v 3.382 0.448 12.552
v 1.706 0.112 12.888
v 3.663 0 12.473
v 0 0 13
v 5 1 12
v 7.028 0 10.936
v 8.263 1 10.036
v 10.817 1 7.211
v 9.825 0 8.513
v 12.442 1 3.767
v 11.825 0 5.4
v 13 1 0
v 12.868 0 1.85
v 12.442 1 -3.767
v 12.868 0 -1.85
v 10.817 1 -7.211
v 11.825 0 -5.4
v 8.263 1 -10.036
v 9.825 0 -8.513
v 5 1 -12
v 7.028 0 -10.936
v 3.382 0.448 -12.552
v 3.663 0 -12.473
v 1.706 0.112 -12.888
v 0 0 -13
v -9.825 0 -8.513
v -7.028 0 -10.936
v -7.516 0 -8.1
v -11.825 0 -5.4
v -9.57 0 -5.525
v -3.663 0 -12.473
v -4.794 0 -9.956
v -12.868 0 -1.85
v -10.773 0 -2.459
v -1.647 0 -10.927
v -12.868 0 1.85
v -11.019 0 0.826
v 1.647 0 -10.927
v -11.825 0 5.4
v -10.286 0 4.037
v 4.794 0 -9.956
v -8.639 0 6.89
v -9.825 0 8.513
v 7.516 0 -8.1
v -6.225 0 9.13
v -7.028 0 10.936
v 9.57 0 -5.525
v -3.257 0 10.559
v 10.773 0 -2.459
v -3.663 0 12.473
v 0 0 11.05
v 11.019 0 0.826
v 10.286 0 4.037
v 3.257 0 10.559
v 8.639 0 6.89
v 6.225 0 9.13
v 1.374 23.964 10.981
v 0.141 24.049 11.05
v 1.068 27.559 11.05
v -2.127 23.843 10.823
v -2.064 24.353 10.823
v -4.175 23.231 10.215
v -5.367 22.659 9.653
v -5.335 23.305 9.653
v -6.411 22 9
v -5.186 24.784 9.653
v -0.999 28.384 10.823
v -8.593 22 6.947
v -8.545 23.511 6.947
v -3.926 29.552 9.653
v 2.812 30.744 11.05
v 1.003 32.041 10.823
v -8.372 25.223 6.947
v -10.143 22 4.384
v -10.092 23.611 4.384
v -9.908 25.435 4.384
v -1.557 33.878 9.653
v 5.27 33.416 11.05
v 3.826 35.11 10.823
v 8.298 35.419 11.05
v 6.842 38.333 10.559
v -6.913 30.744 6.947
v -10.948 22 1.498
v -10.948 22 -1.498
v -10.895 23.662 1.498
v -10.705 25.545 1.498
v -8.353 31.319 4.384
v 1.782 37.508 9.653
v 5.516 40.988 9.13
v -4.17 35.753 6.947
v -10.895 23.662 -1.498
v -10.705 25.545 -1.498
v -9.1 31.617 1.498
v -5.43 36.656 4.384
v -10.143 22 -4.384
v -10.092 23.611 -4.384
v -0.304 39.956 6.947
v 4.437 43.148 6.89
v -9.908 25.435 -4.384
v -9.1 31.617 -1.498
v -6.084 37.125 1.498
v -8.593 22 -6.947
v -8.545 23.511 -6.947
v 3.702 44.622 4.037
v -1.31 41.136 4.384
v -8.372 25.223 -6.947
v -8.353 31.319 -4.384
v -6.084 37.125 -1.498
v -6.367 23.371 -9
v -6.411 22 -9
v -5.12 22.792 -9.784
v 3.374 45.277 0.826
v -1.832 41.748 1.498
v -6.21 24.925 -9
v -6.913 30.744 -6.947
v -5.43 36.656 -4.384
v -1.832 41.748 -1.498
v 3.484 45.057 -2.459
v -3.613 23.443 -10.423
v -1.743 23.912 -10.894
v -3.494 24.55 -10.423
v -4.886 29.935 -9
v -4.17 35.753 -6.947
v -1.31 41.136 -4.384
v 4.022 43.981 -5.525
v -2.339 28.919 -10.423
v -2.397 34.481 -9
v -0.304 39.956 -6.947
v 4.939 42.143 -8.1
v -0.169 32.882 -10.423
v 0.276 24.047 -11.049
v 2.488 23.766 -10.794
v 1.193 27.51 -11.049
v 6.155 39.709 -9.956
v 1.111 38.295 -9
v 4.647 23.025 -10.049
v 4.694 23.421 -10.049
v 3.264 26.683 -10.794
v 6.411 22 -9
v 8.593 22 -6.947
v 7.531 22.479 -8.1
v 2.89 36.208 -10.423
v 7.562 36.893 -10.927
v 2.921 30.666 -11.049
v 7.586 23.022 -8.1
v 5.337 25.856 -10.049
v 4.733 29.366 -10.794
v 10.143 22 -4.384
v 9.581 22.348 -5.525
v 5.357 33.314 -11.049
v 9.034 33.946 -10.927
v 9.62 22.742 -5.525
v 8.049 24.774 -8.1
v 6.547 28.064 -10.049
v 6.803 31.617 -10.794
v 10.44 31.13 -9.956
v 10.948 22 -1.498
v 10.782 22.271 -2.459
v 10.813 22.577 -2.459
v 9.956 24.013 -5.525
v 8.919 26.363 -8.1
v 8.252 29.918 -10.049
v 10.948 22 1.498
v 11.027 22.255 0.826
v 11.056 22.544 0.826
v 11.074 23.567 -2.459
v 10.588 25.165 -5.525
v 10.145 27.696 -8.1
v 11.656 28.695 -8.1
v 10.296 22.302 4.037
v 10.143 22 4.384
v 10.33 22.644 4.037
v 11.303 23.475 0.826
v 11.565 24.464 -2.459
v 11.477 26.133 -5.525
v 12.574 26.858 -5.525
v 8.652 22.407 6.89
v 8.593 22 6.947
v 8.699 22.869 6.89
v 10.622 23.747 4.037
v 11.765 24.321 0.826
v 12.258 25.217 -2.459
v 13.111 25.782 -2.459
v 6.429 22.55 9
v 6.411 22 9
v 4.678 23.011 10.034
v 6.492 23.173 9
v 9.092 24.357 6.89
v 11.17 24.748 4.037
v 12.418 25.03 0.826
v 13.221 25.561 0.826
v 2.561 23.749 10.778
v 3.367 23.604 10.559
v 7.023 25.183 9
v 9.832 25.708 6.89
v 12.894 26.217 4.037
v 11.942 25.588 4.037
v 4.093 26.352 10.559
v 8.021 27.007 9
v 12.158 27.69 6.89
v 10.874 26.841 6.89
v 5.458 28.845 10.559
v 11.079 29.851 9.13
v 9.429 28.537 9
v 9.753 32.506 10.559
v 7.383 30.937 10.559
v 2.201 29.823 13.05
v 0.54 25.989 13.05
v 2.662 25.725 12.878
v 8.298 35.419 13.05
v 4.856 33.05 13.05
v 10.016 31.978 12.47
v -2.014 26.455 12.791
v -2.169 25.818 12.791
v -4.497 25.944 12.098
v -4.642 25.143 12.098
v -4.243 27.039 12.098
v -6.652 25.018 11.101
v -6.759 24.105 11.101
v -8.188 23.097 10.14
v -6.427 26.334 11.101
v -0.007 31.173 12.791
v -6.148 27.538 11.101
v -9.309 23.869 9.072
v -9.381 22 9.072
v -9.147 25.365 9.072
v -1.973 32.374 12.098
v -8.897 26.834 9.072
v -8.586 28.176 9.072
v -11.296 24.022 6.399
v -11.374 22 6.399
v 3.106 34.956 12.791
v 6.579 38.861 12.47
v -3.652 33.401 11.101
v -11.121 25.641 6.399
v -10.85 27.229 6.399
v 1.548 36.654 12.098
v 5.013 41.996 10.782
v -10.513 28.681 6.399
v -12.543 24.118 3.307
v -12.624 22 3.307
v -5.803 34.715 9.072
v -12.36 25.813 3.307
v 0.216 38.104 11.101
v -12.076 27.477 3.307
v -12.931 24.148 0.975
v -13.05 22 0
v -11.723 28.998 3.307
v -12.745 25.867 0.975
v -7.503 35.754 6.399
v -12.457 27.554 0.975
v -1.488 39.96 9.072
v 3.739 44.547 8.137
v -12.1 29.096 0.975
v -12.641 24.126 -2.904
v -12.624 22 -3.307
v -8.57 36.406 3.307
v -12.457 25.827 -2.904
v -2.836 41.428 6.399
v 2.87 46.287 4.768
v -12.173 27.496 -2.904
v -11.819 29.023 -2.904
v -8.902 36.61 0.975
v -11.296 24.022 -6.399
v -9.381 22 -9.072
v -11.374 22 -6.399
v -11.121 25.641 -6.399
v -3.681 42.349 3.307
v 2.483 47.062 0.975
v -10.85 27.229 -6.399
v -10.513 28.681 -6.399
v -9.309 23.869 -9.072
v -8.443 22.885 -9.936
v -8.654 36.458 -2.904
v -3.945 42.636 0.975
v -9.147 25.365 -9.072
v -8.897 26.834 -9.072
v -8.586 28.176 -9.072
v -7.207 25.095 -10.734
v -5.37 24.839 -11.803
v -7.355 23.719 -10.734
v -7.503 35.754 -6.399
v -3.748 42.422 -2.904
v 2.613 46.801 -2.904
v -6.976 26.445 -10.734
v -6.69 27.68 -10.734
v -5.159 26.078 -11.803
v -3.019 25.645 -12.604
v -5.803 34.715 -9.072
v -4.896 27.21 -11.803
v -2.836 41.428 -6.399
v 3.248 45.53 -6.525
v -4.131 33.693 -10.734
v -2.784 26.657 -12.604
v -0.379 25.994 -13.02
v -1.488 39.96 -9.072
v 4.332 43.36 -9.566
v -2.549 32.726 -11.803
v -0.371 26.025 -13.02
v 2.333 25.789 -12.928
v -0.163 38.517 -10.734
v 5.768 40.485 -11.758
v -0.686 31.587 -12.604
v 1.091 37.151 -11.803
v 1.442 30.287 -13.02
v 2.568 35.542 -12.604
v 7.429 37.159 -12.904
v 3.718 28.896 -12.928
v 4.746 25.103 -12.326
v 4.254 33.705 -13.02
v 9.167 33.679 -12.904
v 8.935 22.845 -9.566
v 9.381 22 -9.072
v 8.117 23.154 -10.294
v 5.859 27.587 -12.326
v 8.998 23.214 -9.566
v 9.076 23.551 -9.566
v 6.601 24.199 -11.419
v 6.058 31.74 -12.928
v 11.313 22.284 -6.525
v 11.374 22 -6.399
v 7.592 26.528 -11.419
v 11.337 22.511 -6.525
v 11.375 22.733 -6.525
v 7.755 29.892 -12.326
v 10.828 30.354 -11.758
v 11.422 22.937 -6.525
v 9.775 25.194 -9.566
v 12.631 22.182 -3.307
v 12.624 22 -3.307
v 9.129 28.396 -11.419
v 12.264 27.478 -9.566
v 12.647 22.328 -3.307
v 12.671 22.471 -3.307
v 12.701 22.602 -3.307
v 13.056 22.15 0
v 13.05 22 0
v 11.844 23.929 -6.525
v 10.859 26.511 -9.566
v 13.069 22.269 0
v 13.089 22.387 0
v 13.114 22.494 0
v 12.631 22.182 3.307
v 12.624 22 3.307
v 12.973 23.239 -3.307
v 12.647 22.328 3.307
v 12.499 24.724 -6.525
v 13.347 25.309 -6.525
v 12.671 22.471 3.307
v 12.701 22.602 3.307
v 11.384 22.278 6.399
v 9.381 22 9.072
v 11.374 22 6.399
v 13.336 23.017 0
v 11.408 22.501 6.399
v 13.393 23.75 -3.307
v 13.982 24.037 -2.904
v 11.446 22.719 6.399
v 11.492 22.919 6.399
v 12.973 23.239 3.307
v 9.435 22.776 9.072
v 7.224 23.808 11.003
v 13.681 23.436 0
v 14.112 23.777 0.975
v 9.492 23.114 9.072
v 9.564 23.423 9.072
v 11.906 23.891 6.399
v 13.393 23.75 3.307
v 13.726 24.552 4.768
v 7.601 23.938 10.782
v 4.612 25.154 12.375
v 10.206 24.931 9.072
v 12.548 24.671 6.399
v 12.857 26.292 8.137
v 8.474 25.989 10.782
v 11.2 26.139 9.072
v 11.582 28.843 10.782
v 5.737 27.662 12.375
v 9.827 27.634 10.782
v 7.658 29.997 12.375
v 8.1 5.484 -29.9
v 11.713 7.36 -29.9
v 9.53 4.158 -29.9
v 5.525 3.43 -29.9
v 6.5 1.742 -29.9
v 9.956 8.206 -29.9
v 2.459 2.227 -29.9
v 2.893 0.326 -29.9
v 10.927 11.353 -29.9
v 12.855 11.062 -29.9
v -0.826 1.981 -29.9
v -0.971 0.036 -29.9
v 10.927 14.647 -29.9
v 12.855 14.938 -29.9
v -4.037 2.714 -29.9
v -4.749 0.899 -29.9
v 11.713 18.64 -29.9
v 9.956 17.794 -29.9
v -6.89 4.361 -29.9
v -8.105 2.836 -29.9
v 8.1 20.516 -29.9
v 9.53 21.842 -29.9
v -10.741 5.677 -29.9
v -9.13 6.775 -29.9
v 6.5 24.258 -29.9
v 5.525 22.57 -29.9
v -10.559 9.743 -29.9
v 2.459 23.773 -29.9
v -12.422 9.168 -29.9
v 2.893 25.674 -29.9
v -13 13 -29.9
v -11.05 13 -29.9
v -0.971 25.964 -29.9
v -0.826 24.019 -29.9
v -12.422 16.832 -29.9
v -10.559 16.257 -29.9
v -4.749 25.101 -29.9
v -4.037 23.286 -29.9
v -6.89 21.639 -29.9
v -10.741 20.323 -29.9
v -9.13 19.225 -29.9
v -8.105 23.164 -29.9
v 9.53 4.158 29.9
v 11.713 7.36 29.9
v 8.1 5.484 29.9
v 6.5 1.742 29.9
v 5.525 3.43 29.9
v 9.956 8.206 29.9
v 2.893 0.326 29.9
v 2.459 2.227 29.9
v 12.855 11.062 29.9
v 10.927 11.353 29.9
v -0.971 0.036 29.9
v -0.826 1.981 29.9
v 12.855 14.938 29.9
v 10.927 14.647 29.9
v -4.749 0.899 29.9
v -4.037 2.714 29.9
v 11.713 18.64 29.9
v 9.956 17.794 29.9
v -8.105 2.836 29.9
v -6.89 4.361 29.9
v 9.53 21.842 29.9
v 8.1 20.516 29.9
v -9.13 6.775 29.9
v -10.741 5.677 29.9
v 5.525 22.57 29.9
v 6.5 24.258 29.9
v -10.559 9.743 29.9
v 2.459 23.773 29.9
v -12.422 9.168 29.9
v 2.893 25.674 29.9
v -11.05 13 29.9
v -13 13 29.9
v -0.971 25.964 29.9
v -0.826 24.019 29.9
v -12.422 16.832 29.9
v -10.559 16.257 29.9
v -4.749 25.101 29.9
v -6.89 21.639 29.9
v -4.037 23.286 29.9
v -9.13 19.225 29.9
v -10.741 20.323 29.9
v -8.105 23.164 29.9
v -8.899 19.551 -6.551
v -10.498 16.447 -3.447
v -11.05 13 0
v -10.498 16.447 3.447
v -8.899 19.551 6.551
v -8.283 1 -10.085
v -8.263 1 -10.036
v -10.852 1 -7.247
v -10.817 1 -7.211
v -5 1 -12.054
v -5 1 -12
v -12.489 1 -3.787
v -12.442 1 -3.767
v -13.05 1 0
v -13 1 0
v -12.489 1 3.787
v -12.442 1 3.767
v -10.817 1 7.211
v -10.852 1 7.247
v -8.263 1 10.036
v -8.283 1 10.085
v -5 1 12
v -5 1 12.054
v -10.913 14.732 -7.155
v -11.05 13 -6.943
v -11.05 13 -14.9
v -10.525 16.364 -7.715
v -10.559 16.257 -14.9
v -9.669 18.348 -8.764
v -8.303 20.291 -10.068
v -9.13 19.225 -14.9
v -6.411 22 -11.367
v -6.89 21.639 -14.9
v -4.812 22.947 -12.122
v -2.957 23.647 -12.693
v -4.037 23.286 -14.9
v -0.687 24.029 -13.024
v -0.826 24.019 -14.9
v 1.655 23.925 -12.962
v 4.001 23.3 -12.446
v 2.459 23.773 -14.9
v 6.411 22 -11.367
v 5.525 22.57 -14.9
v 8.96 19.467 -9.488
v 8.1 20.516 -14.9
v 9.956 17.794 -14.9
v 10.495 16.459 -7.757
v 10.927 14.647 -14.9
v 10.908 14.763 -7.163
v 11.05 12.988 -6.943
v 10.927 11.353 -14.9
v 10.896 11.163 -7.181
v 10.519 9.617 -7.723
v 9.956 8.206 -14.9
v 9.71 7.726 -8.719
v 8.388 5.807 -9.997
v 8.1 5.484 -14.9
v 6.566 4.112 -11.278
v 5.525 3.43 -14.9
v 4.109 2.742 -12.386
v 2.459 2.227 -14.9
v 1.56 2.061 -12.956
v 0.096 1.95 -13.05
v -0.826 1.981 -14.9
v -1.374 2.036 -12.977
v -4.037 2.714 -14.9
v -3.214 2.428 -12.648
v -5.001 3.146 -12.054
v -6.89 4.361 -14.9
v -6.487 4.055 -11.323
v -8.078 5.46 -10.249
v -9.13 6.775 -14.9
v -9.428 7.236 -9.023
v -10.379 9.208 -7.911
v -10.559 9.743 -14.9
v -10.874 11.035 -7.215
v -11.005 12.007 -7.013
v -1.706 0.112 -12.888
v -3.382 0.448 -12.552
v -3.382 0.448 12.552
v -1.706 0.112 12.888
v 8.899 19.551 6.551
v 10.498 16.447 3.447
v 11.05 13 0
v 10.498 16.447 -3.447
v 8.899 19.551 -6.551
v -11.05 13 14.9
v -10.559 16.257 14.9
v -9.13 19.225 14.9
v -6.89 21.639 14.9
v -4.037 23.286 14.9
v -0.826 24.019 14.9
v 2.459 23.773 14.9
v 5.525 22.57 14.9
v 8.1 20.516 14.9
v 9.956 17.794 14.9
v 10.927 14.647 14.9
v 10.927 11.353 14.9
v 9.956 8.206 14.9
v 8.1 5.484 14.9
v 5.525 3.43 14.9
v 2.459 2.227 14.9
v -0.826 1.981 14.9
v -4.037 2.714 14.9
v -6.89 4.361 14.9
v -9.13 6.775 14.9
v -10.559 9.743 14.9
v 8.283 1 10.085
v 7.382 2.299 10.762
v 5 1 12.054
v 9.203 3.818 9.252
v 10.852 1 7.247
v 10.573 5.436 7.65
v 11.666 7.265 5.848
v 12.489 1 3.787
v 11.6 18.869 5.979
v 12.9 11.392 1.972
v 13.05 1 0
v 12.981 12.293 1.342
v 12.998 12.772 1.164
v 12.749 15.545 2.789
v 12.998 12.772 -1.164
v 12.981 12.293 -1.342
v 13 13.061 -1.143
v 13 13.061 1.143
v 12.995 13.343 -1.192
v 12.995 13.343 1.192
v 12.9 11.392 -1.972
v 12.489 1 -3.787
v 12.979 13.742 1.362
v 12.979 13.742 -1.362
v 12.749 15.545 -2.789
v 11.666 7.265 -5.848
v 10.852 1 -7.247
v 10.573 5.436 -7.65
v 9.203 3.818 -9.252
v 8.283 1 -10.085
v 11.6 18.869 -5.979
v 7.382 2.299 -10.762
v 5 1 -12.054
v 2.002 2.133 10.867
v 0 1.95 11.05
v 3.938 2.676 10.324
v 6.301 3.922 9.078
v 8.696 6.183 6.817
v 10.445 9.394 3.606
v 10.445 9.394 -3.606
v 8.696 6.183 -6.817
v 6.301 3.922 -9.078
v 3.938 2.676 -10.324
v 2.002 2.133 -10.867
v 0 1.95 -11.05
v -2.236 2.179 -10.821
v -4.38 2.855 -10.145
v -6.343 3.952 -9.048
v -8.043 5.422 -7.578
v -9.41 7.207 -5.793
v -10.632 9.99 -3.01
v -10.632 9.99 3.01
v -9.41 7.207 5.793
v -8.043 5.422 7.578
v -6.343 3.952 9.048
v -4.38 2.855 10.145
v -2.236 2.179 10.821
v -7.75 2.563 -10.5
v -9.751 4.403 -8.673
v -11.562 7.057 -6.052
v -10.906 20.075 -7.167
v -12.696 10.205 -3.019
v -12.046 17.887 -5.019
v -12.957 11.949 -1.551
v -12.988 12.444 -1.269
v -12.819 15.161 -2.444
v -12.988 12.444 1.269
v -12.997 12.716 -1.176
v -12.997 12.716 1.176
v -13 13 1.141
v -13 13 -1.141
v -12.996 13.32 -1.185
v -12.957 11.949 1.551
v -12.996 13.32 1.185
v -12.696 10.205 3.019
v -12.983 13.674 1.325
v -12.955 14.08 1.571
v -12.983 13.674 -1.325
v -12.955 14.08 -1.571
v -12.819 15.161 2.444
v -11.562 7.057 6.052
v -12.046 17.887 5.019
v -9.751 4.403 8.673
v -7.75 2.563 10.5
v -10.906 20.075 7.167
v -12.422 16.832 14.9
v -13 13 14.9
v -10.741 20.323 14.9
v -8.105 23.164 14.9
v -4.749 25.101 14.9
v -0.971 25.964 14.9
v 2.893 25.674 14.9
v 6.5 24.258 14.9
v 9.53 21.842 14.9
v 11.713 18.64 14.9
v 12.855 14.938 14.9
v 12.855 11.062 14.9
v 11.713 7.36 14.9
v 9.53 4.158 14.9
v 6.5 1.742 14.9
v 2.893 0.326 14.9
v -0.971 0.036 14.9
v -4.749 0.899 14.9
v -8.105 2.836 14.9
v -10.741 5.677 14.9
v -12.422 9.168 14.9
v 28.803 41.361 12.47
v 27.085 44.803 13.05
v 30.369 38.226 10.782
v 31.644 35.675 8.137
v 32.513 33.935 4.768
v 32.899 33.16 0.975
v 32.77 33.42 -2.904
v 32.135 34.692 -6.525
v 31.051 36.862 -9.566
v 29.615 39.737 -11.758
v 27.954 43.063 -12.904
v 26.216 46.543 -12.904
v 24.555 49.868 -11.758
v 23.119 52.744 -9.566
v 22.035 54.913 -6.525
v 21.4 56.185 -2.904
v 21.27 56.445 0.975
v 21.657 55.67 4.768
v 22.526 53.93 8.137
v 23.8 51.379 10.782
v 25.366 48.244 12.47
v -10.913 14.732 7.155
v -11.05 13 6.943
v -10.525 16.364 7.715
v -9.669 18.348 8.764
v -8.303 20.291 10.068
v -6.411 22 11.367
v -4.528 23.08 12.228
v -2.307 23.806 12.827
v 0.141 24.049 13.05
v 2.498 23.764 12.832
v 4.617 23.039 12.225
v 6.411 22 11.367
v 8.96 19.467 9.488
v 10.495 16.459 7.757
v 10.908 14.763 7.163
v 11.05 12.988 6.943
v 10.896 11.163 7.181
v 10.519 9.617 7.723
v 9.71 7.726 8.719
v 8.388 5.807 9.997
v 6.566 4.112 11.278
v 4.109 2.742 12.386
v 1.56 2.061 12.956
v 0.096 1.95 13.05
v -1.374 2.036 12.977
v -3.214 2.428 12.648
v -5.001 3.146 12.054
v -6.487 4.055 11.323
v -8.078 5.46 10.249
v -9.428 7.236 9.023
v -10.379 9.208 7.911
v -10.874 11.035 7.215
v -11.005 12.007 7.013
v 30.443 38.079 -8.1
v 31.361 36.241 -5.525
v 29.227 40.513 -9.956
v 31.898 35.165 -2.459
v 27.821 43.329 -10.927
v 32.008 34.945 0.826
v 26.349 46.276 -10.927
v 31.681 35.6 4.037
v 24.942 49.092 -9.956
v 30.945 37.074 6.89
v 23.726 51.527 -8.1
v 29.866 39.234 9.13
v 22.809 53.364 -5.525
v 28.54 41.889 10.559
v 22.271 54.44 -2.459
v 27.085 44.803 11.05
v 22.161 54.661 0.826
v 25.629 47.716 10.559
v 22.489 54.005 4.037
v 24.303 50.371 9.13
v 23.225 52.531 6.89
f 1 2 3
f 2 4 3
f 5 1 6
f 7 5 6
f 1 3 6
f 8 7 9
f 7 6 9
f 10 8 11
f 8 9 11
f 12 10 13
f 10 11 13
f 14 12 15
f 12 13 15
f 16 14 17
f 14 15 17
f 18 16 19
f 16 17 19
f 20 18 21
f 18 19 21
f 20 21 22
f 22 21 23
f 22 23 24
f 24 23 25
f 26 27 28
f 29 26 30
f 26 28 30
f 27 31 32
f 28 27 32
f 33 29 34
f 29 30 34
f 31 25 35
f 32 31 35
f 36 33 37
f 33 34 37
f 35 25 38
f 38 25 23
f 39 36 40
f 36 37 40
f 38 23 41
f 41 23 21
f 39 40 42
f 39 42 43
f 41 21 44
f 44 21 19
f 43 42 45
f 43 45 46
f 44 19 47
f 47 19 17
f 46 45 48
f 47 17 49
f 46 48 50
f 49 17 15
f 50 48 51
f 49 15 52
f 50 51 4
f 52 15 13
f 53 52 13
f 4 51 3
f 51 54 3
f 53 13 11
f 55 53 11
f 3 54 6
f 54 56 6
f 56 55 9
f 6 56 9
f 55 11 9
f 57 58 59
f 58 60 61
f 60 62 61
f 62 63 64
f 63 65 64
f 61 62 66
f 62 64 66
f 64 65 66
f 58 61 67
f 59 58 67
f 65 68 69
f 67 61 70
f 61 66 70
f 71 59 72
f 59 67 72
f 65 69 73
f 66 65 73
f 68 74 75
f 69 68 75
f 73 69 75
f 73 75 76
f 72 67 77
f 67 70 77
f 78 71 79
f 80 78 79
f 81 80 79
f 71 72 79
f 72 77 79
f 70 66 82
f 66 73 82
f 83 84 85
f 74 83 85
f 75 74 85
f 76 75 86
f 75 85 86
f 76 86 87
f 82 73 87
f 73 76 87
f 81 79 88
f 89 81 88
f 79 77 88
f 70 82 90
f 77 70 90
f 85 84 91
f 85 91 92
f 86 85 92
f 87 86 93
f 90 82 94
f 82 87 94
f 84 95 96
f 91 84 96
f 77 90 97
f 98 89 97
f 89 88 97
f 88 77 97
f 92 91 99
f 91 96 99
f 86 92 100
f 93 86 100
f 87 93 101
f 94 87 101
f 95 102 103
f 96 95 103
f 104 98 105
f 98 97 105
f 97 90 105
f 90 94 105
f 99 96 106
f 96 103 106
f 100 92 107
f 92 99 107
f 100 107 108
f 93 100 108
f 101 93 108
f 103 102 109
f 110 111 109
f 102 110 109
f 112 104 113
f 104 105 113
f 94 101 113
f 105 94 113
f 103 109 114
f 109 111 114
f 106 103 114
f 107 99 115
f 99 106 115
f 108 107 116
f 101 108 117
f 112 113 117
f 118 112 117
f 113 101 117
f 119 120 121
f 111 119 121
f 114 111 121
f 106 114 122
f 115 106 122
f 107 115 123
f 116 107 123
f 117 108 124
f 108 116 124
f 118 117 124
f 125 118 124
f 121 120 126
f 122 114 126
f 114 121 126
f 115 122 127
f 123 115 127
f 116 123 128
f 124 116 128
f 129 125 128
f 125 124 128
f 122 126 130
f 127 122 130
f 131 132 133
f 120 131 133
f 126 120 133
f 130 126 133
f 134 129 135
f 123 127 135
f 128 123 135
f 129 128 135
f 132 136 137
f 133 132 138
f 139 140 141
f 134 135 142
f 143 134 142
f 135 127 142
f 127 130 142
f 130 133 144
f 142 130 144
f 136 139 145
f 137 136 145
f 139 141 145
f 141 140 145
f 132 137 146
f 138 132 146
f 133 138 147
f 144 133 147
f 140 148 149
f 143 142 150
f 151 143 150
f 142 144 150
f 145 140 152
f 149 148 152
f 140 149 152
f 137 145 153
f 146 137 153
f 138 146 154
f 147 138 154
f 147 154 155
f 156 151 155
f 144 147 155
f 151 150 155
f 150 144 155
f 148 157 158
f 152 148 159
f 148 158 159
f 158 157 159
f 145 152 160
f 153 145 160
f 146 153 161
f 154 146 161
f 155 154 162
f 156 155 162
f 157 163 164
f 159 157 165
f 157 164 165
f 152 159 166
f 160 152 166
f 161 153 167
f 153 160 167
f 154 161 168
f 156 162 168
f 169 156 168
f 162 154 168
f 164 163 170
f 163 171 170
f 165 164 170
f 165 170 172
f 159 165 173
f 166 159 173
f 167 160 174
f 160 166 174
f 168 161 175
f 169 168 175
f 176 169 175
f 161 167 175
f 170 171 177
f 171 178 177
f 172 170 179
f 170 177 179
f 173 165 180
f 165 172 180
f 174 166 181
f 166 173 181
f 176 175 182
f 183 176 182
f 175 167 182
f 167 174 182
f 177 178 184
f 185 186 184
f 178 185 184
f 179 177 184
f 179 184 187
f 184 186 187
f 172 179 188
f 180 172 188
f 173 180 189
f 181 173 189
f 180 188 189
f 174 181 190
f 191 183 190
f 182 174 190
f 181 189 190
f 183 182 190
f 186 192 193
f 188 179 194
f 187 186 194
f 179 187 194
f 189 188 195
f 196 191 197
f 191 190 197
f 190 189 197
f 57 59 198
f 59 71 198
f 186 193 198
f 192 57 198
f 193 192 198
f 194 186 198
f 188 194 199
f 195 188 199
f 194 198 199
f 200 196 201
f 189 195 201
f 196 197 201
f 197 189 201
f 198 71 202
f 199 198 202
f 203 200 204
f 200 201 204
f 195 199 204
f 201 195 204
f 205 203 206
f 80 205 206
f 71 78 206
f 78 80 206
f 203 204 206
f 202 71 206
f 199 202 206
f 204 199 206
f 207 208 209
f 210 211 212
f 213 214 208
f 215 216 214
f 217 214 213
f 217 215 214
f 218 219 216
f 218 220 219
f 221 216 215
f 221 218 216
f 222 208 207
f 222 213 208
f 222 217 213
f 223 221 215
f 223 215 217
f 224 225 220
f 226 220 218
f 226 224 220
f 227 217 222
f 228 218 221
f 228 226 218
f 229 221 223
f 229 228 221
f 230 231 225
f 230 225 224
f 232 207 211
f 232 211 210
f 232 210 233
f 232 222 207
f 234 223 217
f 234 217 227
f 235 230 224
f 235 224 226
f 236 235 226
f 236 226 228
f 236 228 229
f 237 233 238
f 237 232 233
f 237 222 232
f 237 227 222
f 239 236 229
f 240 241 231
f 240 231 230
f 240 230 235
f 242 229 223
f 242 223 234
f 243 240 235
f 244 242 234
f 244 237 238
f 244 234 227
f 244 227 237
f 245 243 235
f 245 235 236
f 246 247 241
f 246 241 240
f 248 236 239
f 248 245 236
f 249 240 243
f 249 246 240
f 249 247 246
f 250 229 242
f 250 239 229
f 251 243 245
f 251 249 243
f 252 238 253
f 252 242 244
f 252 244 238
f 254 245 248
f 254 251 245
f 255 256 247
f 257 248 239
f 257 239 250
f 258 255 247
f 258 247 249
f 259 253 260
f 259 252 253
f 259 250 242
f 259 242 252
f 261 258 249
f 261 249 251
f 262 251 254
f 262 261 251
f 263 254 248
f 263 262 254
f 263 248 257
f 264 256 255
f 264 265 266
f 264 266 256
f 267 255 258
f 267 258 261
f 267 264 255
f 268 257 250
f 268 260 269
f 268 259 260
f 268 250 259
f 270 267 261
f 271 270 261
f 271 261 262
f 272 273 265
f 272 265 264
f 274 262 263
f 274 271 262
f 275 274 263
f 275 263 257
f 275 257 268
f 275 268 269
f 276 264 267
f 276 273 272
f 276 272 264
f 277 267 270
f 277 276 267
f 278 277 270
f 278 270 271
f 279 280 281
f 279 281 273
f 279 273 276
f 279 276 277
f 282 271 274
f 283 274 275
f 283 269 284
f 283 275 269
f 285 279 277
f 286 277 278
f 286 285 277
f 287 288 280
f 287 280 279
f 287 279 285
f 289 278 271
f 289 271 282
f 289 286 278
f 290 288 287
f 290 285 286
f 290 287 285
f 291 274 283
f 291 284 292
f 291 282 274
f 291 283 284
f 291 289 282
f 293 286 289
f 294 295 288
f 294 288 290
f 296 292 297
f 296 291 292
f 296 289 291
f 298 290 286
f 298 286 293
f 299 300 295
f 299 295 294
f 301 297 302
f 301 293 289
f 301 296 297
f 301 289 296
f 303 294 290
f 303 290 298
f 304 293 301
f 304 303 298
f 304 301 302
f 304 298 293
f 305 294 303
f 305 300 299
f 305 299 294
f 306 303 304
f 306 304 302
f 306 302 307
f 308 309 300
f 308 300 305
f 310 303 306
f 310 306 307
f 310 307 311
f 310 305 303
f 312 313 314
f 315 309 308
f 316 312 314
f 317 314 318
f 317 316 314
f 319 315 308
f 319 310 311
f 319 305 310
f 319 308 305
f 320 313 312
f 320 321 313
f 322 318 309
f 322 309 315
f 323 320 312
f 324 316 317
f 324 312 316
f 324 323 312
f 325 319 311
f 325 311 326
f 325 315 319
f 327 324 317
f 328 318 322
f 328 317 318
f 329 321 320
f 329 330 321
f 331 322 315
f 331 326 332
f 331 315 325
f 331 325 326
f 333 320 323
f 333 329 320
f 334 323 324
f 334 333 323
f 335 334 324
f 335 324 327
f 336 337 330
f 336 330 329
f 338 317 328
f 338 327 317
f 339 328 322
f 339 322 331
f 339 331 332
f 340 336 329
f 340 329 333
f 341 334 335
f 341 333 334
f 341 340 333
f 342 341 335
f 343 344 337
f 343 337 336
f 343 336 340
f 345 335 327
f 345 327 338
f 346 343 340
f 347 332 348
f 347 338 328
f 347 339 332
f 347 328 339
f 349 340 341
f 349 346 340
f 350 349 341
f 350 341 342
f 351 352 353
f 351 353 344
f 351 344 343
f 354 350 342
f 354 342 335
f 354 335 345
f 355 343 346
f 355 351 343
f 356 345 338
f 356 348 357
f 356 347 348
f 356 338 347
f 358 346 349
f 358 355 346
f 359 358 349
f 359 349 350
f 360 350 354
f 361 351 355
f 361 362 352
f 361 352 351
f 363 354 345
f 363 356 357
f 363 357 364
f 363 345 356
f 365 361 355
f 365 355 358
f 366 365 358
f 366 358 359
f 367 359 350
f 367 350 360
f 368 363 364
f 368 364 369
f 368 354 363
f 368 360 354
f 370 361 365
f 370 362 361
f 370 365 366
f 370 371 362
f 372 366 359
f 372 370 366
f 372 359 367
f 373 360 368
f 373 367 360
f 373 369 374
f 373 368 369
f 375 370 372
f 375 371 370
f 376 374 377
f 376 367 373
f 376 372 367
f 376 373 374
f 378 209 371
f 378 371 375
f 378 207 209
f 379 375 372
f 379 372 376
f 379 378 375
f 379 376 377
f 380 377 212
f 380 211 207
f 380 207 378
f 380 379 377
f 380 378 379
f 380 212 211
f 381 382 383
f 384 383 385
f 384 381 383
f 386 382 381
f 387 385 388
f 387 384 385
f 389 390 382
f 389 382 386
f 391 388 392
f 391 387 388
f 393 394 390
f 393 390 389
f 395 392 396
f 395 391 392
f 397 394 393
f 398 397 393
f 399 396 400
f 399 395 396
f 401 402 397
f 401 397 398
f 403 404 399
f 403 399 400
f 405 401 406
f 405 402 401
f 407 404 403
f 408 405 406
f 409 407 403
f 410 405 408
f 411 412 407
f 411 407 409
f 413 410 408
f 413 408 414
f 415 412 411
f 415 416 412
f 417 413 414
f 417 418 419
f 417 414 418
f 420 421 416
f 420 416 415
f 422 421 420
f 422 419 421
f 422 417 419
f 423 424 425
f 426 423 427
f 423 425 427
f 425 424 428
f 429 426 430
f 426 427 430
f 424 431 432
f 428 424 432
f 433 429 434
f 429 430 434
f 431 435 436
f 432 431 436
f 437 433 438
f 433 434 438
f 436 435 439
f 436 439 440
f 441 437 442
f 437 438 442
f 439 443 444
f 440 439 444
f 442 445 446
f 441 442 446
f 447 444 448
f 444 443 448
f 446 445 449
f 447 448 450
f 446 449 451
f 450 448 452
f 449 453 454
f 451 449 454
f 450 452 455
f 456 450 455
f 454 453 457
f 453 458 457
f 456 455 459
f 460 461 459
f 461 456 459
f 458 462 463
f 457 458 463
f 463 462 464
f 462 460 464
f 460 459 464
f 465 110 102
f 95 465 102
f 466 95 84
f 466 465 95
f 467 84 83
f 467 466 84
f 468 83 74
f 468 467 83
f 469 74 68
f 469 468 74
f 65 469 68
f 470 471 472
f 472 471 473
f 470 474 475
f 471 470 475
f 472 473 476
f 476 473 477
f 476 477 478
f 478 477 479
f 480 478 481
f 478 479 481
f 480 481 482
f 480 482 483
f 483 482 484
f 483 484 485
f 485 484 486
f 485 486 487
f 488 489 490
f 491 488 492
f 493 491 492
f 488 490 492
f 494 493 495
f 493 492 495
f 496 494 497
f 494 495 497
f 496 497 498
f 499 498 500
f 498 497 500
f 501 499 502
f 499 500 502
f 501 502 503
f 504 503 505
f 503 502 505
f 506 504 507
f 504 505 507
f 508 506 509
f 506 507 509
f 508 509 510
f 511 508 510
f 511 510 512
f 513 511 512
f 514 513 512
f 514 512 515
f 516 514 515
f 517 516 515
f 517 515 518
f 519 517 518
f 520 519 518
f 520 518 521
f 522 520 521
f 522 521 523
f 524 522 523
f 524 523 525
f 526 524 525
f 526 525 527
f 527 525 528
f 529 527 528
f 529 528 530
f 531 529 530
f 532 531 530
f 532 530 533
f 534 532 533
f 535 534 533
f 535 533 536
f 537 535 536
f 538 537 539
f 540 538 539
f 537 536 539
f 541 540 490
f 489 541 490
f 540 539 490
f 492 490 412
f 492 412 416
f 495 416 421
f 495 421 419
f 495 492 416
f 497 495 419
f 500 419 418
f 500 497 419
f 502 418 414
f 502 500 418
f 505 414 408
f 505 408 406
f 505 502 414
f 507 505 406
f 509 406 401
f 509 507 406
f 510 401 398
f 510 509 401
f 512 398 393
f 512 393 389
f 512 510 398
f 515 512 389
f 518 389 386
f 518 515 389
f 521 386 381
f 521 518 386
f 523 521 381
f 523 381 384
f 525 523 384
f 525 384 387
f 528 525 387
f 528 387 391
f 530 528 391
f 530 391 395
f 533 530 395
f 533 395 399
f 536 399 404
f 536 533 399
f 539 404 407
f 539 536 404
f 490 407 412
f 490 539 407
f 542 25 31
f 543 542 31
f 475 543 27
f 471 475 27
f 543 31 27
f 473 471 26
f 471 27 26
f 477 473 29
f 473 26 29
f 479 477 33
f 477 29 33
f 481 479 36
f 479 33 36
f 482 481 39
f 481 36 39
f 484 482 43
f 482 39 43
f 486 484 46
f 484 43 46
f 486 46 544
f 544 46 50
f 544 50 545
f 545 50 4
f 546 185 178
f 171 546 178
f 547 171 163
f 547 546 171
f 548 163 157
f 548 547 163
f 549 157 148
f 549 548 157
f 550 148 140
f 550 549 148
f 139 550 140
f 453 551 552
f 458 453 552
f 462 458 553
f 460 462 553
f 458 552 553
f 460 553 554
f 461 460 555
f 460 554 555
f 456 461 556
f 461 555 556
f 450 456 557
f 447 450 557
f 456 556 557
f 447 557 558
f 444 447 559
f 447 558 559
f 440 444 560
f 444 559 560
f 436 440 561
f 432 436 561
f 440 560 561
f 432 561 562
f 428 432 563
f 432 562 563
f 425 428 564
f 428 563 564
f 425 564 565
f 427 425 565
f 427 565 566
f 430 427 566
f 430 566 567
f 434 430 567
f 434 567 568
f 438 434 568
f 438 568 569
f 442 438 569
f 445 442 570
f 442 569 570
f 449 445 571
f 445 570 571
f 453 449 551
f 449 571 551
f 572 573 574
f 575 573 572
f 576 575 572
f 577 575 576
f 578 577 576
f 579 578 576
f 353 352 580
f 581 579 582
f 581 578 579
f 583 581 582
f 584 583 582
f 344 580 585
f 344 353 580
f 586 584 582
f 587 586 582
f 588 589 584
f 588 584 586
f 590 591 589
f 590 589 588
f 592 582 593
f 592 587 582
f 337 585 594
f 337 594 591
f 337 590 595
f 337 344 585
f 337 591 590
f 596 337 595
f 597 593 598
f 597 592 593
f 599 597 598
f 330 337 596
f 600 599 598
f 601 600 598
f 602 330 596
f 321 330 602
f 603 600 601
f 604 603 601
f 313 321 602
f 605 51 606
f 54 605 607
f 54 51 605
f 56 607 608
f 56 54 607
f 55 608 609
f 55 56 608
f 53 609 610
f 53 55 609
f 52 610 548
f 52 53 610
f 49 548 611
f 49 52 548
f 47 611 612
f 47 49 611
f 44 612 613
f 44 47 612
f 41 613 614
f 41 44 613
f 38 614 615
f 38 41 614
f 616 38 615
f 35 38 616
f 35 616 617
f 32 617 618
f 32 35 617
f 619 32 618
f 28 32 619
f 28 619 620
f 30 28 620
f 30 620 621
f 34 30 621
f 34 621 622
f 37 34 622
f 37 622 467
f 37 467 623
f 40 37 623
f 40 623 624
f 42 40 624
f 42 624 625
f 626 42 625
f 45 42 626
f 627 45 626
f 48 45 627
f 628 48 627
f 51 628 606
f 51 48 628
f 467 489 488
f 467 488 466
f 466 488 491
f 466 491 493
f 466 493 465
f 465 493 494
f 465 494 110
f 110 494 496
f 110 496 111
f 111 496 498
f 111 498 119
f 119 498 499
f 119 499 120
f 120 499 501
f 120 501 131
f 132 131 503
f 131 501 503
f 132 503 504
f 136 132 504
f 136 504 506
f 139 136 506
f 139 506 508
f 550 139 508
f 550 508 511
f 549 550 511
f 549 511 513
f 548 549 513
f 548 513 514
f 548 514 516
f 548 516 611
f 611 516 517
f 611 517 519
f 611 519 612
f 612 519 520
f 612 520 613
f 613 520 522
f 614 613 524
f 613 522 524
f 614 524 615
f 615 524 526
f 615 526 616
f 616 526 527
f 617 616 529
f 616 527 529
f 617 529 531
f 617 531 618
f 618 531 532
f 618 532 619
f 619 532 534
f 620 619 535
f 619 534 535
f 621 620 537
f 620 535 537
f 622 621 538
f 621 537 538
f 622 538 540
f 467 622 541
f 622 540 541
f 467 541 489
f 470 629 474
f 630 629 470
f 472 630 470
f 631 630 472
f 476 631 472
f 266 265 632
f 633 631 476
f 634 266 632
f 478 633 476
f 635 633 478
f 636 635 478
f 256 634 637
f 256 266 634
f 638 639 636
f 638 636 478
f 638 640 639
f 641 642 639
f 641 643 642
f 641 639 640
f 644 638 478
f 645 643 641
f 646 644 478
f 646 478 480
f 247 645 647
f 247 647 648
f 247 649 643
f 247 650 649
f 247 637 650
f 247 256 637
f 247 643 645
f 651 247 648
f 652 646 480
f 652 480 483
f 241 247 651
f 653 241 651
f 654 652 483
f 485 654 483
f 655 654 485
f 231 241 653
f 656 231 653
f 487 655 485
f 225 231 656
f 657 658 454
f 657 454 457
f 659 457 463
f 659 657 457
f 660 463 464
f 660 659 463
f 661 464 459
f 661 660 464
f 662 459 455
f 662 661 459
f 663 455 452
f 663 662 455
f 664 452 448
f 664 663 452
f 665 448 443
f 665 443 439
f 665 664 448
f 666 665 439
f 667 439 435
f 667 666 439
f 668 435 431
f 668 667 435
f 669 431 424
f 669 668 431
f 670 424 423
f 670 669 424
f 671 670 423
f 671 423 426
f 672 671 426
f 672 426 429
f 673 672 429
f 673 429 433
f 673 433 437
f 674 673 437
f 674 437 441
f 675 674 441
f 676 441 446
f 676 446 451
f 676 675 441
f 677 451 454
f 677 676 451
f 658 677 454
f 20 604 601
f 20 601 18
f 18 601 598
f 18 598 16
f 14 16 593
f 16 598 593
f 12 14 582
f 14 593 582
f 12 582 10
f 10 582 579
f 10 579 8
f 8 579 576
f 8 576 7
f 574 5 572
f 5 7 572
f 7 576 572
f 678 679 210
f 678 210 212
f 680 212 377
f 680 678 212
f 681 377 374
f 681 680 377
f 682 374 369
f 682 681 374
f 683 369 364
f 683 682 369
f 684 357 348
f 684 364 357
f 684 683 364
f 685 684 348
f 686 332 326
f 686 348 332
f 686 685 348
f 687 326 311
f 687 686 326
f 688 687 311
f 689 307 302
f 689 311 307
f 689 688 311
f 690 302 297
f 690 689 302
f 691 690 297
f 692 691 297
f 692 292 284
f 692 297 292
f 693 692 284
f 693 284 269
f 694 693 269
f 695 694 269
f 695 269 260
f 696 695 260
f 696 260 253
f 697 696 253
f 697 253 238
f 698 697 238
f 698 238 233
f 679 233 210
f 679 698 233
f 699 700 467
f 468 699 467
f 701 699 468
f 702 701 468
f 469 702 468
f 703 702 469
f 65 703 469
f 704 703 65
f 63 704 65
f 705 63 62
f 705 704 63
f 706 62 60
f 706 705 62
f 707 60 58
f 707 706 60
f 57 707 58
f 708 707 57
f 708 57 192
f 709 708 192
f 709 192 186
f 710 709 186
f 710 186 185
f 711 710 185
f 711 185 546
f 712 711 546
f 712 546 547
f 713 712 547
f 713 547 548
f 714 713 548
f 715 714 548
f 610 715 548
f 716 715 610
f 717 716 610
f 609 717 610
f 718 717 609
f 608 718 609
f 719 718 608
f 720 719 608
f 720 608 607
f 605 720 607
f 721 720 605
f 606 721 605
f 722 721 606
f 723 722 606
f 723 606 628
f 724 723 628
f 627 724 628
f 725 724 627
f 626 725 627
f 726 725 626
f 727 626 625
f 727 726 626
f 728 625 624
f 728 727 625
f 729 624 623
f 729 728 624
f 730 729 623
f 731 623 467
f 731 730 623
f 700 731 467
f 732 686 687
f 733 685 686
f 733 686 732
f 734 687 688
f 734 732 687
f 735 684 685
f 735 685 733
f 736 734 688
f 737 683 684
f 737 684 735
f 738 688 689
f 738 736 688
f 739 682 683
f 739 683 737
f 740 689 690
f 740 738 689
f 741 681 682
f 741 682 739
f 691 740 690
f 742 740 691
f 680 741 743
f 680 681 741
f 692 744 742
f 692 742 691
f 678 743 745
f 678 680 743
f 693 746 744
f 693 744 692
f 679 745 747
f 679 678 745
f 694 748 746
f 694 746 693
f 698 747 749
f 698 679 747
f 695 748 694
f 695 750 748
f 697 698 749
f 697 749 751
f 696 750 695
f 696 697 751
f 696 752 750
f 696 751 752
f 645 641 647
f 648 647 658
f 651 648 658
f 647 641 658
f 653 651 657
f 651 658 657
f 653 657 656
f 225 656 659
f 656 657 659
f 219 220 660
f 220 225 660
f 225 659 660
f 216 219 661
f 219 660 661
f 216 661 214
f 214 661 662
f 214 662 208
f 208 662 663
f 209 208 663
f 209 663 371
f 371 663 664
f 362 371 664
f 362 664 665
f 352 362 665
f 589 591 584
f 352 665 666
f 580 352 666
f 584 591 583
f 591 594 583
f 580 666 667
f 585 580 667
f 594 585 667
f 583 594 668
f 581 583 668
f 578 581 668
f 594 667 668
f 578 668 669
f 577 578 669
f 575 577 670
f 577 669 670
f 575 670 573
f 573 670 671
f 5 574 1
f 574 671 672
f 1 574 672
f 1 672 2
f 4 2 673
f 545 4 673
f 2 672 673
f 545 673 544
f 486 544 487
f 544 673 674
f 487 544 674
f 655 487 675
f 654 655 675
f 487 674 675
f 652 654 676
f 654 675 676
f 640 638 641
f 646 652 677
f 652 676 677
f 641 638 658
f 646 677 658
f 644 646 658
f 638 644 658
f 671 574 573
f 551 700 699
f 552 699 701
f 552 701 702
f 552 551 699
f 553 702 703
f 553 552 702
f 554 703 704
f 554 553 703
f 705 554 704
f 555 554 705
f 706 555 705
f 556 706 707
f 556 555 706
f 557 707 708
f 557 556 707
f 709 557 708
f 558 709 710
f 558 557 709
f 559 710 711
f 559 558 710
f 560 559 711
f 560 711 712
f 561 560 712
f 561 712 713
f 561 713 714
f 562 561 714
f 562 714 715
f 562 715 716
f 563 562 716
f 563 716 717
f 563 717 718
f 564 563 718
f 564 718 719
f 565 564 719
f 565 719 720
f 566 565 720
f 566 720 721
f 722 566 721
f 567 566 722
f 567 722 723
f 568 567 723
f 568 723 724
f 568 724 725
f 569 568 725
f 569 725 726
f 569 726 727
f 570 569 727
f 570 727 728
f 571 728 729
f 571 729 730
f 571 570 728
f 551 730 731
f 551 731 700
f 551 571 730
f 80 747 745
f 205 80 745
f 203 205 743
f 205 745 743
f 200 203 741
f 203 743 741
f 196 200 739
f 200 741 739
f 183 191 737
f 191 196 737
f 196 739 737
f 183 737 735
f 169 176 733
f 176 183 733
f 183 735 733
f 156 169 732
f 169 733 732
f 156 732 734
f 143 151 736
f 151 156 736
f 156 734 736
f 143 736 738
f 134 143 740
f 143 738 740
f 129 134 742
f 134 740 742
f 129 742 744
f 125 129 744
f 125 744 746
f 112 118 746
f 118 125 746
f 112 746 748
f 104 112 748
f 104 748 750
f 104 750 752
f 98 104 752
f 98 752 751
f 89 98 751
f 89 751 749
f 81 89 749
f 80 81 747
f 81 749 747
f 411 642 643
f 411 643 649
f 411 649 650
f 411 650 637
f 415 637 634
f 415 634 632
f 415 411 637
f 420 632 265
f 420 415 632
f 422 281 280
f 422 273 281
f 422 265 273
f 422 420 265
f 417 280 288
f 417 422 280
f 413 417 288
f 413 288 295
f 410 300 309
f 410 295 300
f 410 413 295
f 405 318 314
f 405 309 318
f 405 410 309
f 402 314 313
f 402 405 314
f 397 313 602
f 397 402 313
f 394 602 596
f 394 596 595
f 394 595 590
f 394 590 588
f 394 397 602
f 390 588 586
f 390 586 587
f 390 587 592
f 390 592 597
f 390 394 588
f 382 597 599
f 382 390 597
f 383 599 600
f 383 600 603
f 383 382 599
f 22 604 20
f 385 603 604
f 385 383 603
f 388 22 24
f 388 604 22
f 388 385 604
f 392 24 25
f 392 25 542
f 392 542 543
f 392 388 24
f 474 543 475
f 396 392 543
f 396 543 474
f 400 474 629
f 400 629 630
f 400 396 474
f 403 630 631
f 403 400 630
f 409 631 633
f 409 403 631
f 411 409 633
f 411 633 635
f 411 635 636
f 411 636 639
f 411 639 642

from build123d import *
from build123d.topology import SkipClean

# Parameters (mm, degrees)
CROQUIS1_R                          = 13
CROQUIS1_R_2                        = 11.05
SALIENTE_EXTRUIR1_DEPTH             = 1
BARRER_L_MINA1_PROFILE_R            = 13.05
BARRER_L_MINA1_PROFILE_R_2          = 11.05
CROQUIS35_R                         = 13
CROQUIS35_R_2                       = 11.05
SALIENTE_EXTRUIR3_DEPTH             = 15
SALIENTE_EXTRUIR3_DIRECTION_2_REACH = 73.094
CORTAR_EXTRUIR1_REACH               = 80.217
CROQUIS37_R                         = 11.05


with BuildPart() as part:
    # Croquis1 → Saliente-Extruir1 (new body)
    with BuildSketch(Plane(origin=(0, 0, 0), x_dir=(1, 0, 0), z_dir=(0, 1, 0))):
        with Locations(Location((0, 0, 0), (0, 0, 270))):
            Circle(CROQUIS1_R)
        with Locations(Location((0, 0, 0), (0, 0, 270))):
            Circle(CROQUIS1_R_2, mode=Mode.SUBTRACT)
    extrude(amount=SALIENTE_EXTRUIR1_DEPTH)

    # Barrer-L_mina1: sweep along a path in Croquis2
    with BuildLine(Plane.XY) as barrer_l_mina1_path:
        Line((0, 1), (0, 22))
        ThreePointArc((0, 22), (2.241962153, 29.88875594), (8.297662704, 35.41933958))
        Line((8.297662704, 35.41933958), (27.084738117, 44.802611794))
    # Barrer-L_mina1 profile (on start of the path) → Barrer-L_mina1 (sweep)
    with BuildSketch(Plane.ZX.offset(1)):
        Circle(BARRER_L_MINA1_PROFILE_R)
        Circle(BARRER_L_MINA1_PROFILE_R_2, mode=Mode.SUBTRACT)
    sweep(path=barrer_l_mina1_path.line)

    # Croquis35 → Saliente-Extruir3 (add)
    with BuildSketch(Plane(origin=(0, 0, -14.9), x_dir=(-1, 0, 0), z_dir=(0, 0, -1))):
        with Locations((0, 13)):
            Circle(CROQUIS35_R)
        with Locations((0, 13)):
            Circle(CROQUIS35_R_2, mode=Mode.SUBTRACT)
    saliente_extruir3 = extrude(amount=SALIENTE_EXTRUIR3_DEPTH)

    # Croquis35 → Saliente-Extruir3 direction 2 (add, up to next)
    with BuildSketch(Plane(origin=(0, 0, -14.9), x_dir=(-1, 0, 0), z_dir=(0, 0, -1)), mode=Mode.PRIVATE) as saliente_extruir3_direction_2_sk1:
        with Locations((0, 13)):
            Circle(CROQUIS35_R)
        with Locations((0, 13)):
            Circle(CROQUIS35_R_2, mode=Mode.SUBTRACT)
    saliente_extruir3_direction_2_tool1 = extrude(saliente_extruir3_direction_2_sk1.sketch, amount=-SALIENTE_EXTRUIR3_DIRECTION_2_REACH, mode=Mode.PRIVATE) - part.part
    saliente_extruir3_direction_2 = saliente_extruir3_direction_2_tool1.solids().sort_by_distance((12.632304, 13, -14.9))[0]
    add(saliente_extruir3_direction_2)

    # Croquis37 → Cortar-Extruir1 (cut, up to next)
    with BuildSketch(Plane(origin=(0, 0, -29.9), x_dir=(-1, 0, 0), z_dir=(0, 0, -1)), mode=Mode.PRIVATE) as cortar_extruir1_sk1:
        with Locations((0, 13)):
            Circle(CROQUIS37_R)
    cortar_extruir1_tool1 = extrude(cortar_extruir1_sk1.sketch, amount=-CORTAR_EXTRUIR1_REACH, mode=Mode.PRIVATE) & part.part
    cortar_extruir1 = cortar_extruir1_tool1.solids().sort_by_distance((0, 13, -29.9))[0]
    add(cortar_extruir1, mode=Mode.SUBTRACT)

    # Simetr_a1: Saliente-Extruir3, Saliente-Extruir3 direction 2, Cortar-Extruir1 across plane
    with SkipClean():  # the faces are left unmerged after this step: merging them gives an invalid solid
        add(saliente_extruir3.mirror(Plane.XY))
        add(saliente_extruir3_direction_2.mirror(Plane.XY))
        add(cortar_extruir1.mirror(Plane.XY), mode=Mode.SUBTRACT)


solid = part.part
